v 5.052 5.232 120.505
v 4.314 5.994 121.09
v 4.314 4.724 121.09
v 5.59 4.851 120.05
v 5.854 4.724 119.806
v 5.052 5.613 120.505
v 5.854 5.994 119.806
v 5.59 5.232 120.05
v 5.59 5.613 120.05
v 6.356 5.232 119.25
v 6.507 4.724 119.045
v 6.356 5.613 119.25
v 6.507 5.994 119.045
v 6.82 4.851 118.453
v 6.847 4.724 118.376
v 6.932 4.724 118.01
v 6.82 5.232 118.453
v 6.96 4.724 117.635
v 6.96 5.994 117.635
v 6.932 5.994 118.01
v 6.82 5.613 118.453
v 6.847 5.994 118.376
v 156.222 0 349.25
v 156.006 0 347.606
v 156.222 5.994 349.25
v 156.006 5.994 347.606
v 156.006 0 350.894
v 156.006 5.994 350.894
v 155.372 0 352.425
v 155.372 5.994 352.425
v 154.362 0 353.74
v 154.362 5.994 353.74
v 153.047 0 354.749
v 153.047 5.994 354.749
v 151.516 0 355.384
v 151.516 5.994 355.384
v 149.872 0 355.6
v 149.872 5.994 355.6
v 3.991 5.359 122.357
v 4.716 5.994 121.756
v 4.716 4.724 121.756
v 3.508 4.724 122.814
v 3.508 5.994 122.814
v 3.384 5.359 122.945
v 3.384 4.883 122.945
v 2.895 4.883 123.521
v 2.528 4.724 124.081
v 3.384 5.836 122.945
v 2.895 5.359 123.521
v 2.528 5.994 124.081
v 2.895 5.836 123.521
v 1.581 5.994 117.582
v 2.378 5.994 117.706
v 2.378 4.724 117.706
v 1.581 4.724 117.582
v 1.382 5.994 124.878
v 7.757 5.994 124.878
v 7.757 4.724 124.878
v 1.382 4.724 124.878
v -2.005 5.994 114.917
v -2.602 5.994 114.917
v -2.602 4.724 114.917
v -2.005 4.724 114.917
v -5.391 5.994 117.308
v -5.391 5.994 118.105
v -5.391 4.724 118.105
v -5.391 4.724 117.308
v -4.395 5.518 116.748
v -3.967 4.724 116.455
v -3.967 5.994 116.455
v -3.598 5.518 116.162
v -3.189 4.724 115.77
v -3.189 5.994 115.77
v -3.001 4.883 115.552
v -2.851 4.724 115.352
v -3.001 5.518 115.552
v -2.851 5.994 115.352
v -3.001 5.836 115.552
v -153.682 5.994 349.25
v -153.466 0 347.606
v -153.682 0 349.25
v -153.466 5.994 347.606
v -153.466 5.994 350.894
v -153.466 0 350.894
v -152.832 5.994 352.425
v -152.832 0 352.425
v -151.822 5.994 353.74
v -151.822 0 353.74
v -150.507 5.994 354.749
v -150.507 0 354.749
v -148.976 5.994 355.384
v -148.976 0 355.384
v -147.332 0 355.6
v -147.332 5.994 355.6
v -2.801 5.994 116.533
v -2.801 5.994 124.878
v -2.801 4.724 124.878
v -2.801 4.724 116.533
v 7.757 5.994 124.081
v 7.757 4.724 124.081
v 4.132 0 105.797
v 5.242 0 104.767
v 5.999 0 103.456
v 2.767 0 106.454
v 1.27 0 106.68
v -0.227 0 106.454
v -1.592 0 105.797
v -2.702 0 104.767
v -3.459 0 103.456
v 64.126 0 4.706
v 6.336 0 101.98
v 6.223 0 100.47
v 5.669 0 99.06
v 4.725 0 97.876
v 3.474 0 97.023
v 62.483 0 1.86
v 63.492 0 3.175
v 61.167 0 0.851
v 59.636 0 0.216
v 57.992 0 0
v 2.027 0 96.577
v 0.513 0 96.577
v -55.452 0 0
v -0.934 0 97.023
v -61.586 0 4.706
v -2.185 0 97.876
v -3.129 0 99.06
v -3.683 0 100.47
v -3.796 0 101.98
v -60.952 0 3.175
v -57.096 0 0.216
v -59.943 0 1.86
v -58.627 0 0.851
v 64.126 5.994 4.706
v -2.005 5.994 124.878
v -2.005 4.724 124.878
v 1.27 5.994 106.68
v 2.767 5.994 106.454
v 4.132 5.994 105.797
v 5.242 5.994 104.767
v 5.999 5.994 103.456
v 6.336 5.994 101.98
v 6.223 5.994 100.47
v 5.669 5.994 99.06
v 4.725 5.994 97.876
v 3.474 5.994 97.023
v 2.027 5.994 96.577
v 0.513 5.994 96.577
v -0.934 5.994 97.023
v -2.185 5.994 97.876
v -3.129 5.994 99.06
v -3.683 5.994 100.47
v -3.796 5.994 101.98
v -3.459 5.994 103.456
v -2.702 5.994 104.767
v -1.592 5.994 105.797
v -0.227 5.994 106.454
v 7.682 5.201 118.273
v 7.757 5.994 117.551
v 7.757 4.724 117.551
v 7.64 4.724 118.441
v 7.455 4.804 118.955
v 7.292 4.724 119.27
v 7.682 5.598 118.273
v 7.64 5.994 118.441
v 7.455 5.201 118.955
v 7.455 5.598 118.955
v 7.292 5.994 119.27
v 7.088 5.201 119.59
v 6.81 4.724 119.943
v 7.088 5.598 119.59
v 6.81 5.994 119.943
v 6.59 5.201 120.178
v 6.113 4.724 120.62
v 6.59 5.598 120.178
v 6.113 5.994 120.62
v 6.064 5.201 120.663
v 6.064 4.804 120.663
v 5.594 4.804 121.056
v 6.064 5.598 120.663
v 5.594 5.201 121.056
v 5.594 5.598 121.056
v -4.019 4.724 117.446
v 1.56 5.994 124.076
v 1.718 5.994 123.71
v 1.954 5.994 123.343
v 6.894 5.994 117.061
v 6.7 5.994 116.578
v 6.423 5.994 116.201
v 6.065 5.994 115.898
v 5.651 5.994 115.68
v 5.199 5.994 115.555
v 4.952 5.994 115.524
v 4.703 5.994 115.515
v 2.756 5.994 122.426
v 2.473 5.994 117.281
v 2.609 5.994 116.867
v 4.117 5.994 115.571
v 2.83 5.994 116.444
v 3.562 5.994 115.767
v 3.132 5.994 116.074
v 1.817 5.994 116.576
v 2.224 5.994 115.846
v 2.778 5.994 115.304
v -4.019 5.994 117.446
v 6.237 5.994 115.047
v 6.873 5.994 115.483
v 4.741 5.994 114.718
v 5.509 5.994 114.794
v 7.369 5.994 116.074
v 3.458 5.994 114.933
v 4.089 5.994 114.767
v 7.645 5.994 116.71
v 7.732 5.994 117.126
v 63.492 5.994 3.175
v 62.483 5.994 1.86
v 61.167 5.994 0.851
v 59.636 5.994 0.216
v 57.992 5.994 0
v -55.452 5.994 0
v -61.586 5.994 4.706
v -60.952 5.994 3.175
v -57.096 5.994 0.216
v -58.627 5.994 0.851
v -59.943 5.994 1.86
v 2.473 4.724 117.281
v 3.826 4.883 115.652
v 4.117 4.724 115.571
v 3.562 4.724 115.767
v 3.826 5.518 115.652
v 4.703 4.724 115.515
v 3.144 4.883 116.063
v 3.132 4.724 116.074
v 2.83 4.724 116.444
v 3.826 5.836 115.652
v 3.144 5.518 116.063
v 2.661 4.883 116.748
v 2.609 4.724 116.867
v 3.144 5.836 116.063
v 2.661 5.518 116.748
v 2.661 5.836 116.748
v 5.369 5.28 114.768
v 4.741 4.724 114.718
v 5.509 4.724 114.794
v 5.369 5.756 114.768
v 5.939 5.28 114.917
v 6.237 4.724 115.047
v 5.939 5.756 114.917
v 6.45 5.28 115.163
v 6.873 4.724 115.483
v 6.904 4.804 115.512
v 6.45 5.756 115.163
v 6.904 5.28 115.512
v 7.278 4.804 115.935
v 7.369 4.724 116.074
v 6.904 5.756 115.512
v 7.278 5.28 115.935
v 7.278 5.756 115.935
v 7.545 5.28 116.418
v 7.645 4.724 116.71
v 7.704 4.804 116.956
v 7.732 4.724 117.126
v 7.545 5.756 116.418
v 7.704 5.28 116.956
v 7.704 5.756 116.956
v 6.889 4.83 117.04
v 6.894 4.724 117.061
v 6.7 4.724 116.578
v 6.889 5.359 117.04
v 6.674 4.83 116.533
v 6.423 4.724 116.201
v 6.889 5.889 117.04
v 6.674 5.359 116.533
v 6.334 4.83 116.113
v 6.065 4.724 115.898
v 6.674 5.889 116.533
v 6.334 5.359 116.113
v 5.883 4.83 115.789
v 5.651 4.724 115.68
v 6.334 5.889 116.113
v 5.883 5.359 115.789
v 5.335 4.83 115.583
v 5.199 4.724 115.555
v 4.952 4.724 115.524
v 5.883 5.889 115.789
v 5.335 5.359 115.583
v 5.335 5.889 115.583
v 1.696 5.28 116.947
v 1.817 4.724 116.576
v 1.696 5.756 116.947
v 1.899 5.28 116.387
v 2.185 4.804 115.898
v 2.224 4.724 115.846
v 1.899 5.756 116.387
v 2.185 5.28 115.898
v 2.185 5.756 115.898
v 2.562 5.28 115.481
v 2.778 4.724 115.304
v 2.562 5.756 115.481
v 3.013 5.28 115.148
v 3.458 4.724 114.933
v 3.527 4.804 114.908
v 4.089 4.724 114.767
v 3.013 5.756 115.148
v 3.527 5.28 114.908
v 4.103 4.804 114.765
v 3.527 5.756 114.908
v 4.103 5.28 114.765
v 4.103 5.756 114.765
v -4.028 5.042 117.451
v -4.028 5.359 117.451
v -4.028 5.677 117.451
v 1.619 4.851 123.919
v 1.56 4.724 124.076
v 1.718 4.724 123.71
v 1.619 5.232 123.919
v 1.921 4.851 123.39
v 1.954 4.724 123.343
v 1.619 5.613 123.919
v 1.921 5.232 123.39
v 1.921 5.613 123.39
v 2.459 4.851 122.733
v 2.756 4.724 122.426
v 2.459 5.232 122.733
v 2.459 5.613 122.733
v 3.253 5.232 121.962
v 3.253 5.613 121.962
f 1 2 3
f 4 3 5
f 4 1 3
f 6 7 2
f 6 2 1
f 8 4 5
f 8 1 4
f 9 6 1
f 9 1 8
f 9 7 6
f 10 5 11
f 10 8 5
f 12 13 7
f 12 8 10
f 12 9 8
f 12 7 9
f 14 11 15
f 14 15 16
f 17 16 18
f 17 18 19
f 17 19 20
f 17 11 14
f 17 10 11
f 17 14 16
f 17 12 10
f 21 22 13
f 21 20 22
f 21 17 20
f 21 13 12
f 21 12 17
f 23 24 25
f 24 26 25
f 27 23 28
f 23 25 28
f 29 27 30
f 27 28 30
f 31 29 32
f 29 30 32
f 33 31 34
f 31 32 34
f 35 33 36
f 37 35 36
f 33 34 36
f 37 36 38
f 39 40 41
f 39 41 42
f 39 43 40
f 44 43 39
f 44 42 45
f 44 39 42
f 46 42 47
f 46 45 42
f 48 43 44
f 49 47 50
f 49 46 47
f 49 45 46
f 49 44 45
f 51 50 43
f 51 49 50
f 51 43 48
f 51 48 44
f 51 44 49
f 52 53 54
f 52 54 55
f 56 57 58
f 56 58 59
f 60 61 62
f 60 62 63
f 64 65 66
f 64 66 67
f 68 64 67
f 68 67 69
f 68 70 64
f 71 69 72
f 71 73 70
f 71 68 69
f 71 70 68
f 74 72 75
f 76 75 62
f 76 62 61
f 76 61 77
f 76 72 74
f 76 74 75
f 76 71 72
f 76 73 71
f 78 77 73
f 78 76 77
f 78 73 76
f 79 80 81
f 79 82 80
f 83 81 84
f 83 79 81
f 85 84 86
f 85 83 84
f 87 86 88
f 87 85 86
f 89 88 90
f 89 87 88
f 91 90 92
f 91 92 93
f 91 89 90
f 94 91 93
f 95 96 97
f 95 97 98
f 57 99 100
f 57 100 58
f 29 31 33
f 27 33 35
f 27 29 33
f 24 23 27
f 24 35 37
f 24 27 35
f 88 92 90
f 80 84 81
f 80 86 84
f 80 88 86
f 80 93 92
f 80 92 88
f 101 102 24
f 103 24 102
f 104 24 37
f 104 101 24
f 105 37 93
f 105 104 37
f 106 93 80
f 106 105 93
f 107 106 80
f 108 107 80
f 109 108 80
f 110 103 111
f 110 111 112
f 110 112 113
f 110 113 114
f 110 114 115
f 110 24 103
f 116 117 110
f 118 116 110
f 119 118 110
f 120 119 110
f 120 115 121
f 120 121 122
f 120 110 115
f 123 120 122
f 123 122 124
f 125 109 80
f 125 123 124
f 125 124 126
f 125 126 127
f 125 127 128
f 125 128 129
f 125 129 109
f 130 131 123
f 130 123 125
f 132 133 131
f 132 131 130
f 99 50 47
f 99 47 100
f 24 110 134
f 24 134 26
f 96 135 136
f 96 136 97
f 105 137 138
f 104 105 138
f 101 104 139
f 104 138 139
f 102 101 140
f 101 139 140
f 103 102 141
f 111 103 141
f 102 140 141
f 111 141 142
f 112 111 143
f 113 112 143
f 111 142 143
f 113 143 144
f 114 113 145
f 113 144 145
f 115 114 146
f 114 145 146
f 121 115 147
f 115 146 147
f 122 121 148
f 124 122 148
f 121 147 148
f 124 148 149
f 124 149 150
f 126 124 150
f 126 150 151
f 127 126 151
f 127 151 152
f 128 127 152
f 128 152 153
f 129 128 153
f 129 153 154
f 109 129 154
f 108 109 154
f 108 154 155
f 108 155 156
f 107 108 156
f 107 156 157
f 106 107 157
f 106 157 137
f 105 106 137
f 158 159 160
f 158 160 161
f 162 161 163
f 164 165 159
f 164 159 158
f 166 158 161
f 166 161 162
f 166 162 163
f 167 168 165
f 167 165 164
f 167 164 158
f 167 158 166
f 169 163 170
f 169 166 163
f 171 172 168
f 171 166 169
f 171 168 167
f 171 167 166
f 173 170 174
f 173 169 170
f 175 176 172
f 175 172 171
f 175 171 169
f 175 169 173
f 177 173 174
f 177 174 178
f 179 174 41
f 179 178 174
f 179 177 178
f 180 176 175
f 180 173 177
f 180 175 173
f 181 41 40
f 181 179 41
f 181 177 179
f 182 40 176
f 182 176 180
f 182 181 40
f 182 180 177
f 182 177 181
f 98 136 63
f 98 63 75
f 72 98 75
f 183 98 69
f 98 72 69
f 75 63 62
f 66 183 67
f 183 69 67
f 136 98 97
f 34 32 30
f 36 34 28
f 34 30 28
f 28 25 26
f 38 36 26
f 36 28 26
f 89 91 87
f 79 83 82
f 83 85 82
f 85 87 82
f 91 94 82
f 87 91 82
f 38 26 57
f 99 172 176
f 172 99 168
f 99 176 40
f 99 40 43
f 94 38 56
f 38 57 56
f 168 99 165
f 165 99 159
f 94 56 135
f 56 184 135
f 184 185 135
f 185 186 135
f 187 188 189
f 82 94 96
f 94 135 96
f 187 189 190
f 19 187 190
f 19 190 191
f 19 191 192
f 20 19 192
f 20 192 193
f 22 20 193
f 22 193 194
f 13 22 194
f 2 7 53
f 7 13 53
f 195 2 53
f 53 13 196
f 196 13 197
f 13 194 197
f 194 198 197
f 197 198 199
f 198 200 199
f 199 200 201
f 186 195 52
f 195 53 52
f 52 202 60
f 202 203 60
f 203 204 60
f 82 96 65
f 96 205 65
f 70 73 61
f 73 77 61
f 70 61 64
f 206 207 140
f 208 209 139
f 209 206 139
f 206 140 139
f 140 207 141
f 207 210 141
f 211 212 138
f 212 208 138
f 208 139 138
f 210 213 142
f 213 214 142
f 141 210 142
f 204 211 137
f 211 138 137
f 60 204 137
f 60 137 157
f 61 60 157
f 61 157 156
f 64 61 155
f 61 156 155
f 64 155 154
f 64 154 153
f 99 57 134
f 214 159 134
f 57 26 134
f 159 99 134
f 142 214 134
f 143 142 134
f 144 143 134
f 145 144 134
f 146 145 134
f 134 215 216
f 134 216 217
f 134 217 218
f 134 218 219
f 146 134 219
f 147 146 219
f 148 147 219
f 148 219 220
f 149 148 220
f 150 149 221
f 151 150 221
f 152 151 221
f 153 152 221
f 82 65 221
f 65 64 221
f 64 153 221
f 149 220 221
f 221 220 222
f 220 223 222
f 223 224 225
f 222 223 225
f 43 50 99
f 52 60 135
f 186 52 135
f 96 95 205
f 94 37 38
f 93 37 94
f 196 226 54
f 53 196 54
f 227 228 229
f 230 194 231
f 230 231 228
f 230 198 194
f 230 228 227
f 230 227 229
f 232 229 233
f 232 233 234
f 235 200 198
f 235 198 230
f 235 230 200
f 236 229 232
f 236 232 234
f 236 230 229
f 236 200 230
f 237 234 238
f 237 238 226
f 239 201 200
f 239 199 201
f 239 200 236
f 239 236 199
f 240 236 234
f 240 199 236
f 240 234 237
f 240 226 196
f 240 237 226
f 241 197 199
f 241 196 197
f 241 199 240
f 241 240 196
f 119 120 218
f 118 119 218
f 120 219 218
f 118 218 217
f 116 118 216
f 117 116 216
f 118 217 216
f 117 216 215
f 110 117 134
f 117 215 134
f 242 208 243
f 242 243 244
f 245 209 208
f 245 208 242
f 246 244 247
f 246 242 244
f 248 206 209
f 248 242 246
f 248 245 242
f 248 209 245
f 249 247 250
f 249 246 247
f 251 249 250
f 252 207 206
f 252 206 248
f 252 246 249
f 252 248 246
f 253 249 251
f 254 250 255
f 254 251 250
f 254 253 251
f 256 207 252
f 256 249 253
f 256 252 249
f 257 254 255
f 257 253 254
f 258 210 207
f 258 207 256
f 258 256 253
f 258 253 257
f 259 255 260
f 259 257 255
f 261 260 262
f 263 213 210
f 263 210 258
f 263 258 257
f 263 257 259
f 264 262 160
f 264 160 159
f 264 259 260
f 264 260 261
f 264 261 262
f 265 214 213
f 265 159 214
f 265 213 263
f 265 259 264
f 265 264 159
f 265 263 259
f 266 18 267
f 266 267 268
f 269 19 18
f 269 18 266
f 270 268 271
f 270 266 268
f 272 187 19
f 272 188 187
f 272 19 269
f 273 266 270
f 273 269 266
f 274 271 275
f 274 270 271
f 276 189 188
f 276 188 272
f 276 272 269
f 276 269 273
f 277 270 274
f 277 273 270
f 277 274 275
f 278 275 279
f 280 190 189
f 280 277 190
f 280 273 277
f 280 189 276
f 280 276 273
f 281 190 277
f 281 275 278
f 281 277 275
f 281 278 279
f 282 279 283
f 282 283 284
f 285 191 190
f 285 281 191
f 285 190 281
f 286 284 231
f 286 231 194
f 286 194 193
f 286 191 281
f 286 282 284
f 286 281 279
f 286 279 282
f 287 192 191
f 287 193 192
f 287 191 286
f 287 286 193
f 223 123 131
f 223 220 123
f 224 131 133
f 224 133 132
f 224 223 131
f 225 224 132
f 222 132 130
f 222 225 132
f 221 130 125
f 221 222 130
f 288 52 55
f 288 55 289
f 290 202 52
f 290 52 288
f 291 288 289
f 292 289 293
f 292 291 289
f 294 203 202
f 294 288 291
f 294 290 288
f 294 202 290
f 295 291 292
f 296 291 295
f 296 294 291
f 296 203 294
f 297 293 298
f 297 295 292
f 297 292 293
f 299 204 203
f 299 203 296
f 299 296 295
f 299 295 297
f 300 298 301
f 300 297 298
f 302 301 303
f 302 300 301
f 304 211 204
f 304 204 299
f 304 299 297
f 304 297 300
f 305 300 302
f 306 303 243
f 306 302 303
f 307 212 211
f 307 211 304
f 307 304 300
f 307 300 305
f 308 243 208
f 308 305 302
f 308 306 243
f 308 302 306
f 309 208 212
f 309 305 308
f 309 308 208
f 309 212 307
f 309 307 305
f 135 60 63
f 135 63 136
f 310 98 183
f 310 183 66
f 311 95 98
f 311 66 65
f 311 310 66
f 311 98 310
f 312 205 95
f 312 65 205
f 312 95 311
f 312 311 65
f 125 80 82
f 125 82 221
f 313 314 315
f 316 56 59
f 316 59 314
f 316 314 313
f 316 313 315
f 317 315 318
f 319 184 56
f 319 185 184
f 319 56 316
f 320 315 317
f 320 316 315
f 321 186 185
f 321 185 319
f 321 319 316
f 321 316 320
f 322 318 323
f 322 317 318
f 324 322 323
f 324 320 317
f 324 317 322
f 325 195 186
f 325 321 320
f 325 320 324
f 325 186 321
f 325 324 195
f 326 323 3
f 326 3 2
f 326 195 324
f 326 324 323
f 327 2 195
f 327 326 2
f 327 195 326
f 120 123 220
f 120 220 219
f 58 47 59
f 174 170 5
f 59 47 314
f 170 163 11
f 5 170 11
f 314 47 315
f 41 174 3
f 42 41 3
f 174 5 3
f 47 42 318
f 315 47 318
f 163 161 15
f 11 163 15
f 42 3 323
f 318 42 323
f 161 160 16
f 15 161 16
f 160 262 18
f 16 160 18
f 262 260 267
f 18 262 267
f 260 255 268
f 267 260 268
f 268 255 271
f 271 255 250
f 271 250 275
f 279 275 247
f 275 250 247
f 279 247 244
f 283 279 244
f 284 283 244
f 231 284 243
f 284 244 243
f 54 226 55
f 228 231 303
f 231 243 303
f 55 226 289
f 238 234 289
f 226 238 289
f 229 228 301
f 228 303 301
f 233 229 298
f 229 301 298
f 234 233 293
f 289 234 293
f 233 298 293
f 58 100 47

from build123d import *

# Parameters (mm, degrees)
BOSS_EXTRUDE1_DEPTH = 5.9944
SKETCH2_R           = 5.08
CUT_EXTRUDE1_DEPTH  = 390.227437664
CUT_EXTRUDE2_DEPTH  = 1.27
FILLET1_R           = 6.35


with BuildPart() as part:
    # Sketch1 → Boss-Extrude1 (new body)
    with BuildSketch(Plane(origin=(0, 0, 0), x_dir=(1, 0, 0), z_dir=(0, 1, 0))):
        Polygon((-60.325, 0), (62.865, 0), (158.147732829, -355.6), (-155.607732829, -355.6), align=None)
    extrude(amount=BOSS_EXTRUDE1_DEPTH)

    # Sketch2 → Cut-Extrude1 (cut, through all)
    with BuildSketch(Plane(origin=(0, 5.9944, 0), x_dir=(1, 0, 0), z_dir=(0, 1, 0))):
        with Locations(Location((1.27, -101.6, 0), (0, 0, 270))):
            Circle(SKETCH2_R)
    extrude(amount=-CUT_EXTRUDE1_DEPTH, mode=Mode.SUBTRACT)

    # Sketch3 → Cut-Extrude2 (cut)
    with BuildSketch(Plane(origin=(0, 5.9944, 0), x_dir=(1, 0, 0), z_dir=(0, 1, 0))):
        with BuildLine():
            Line((-2.004607843, -124.878144621), (-2.801470588, -124.878144621))
            Line((-2.801470588, -124.878144621), (-2.801470588, -116.532875013))
            add(Edge.make_bspline(
                [(-2.801470588, -116.532875013), (-2.997580196, -116.700819797), (-3.386189924, -117.033618267), (-4.021446732, -117.460305556), (-4.686888668, -117.826576867), (-5.156638111, -118.012129239), (-5.39127451, -118.104811287)],
                knots=[0, 0, 0, 0, 1.01587232, 2.013047047, 3.007531584, 4, 4, 4, 4], degree=3))
            Line((-5.39127451, -118.104811287), (-5.39127451, -117.307948542))
            add(Edge.make_bspline(
                [(-5.39127451, -117.307948542), (-5.215920906, -117.217505842), (-4.877167455, -117.042785871), (-4.403316888, -116.758839494), (-3.978244692, -116.470049726), (-3.602949198, -116.17444242), (-3.276786637, -115.872526552), (-3.001240232, -115.563383013), (-2.771725814, -115.249055295), (-2.657674184, -115.025829059), (-2.602254902, -114.917360307)],
                knots=[0, 0, 0, 0, 1.266365021, 2.446402654, 3.543839948, 4.563310278, 5.51059178, 6.392882026, 7.219078889, 8, 8, 8, 8], degree=3))
            Line((-2.602254902, -114.917360307), (-2.004607843, -114.917360307))
            Line((-2.004607843, -114.917360307), (-2.004607843, -124.878144621))
        make_face()
        with BuildLine():
            Line((7.756960784, -124.878144621), (1.382058824, -124.878144621))
            add(Edge.make_bspline(
                [(1.382058824, -124.878144621), (1.408711728, -124.714616011), (1.461765394, -124.389105805), (1.581972244, -123.981996467), (1.743426669, -123.650686593), (1.9293472, -123.370987394), (2.168929241, -123.057519518), (2.47120082, -122.71410621), (2.835292405, -122.341606598), (3.26682725, -121.943231351), (3.76528863, -121.520849044), (4.12547647, -121.238121937), (4.314264706, -121.089933836)],
                knots=[0, 0, 0, 0, 1.00794059, 2.006345856, 2.568221262, 3.244176762, 4.045978883, 4.967707078, 6.025786227, 7.214078669, 8.539791974, 10, 10, 10, 10], degree=3))
            add(Edge.make_bspline(
                [(4.314264706, -121.089933836), (4.44517426, -120.987435642), (4.692315869, -120.79393129), (5.03663113, -120.518956984), (5.330891728, -120.274531461), (5.654603916, -119.998078646), (6.00245485, -119.669813627), (6.353952481, -119.268109359), (6.634490533, -118.868145818), (6.82961898, -118.465238329), (6.941715143, -118.053908101), (6.953924697, -117.775536057), (6.960098039, -117.634786777)],
                knots=[0, 0, 0, 0, 1.105083233, 2.086265203, 2.928643677, 3.647492745, 4.915719202, 6.103603942, 7.190110835, 8.152548768, 9.065899631, 10, 10, 10, 10], degree=3))
            add(Edge.make_bspline(
                [(6.960098039, -117.634786777), (6.956446087, -117.531840775), (6.949349268, -117.331786414), (6.896203587, -117.042256181), (6.805514931, -116.774954845), (6.678536736, -116.530021827), (6.524513793, -116.305351489), (6.336809674, -116.107371083), (6.124267579, -115.931524187), (5.883239638, -115.782669248), (5.619825862, -115.659684087), (5.331783261, -115.577707036), (5.025139044, -115.521422364), (4.812576912, -115.517184746), (4.703357843, -115.515007366)],
                knots=[0, 0, 0, 0, 1.066440105, 2.072406788, 3.038089023, 3.980626898, 4.923164774, 5.851240192, 6.79842777, 7.774055624, 8.779619978, 9.800248095, 10.869719403, 12, 12, 12, 12], degree=3))
            add(Edge.make_bspline(
                [(4.703357843, -115.515007366), (4.548138853, -115.520928959), (4.250554949, -115.532281765), (3.828569287, -115.636647969), (3.455686954, -115.810346784), (3.131253079, -116.053703201), (2.863324958, -116.371844332), (2.643875434, -116.754056503), (2.47967465, -117.206553497), (2.413141707, -117.534067539), (2.378137255, -117.706379915)],
                knots=[0, 0, 0, 0, 1.052503955, 2.0178474, 2.928593632, 3.828899676, 4.748107049, 5.732867451, 6.807211463, 8, 8, 8, 8], degree=3))
            Line((2.378137255, -117.706379915), (1.58127451, -117.581870111))
            add(Edge.make_bspline(
                [(1.58127451, -117.581870111), (1.595076615, -117.472635137), (1.622075599, -117.258955176), (1.691468745, -116.949821561), (1.781188383, -116.65900971), (1.894180859, -116.386211747), (2.027180985, -116.131787712), (2.181450374, -115.894298832), (2.359285462, -115.67667965), (2.558282869, -115.477221584), (2.777101916, -115.300105787), (3.010614318, -115.143004122), (3.261947111, -115.012623851), (3.527029837, -114.902576084), (3.808744154, -114.818752319), (4.105725503, -114.759825606), (4.418264758, -114.725756279), (4.631681691, -114.72071836), (4.740710784, -114.718144621)],
                knots=[0, 0, 0, 0, 1.11558569, 2.182252598, 3.206865404, 4.197163727, 5.171016007, 6.113287932, 7.062752653, 8.014719109, 8.96418383, 9.912249364, 10.862587531, 11.829428462, 12.817713982, 13.836697005, 14.894825442, 16, 16, 16, 16], degree=3))
            add(Edge.make_bspline(
                [(4.740710784, -114.718144621), (4.847691173, -114.72046441), (5.058171976, -114.725028527), (5.36652187, -114.763086832), (5.660393604, -114.82495492), (5.939114933, -114.911807601), (6.20152099, -115.026029366), (6.453209418, -115.158232899), (6.686929332, -115.3230483), (6.90677244, -115.507442597), (7.10466303, -115.712898212), (7.281765919, -115.930826025), (7.427856103, -116.167038419), (7.551242282, -116.415109275), (7.639716311, -116.6810721), (7.709539512, -116.957384709), (7.75083418, -117.249641754), (7.754889172, -117.448930261), (7.756960784, -117.55074266)],
                knots=[0, 0, 0, 0, 1.106681904, 2.177364475, 3.209175827, 4.210887483, 5.192078542, 6.167200624, 7.147039734, 8.145062256, 9.132109826, 10.094560107, 11.044836899, 12.000375742, 12.954465884, 13.938765234, 14.946957558, 16, 16, 16, 16], degree=3))
            add(Edge.make_bspline(
                [(7.756960784, -117.55074266), (7.753392459, -117.673373377), (7.746338565, -117.915790814), (7.689282598, -118.27439108), (7.590587318, -118.620687231), (7.461036956, -118.958802553), (7.290519429, -119.282309345), (7.09006167, -119.596153204), (6.8567572, -119.897227952), (6.634069689, -120.13817633), (6.430892234, -120.330451922), (6.256380071, -120.493260828), (6.057657341, -120.670326555), (5.833743473, -120.859320414), (5.585765126, -121.061219336), (5.319829881, -121.283578823), (5.026752033, -121.516537042), (4.821857186, -121.674370634), (4.715808824, -121.756061287)],
                knots=[0, 0, 0, 0, 1.088993338, 2.152731221, 3.214950677, 4.282992305, 5.363056107, 6.45734114, 7.587448717, 8.741912054, 9.367708333, 10.072059012, 10.861970471, 11.731730561, 12.674646287, 13.702521352, 14.810883478, 16, 16, 16, 16], degree=3))
            add(Edge.make_bspline(
                [(4.715808824, -121.756061287), (4.589531577, -121.855817691), (4.343139397, -122.050462401), (3.994847151, -122.350096885), (3.673432745, -122.643330902), (3.386447313, -122.938064959), (3.127000006, -123.22720294), (2.897403274, -123.51287463), (2.693792631, -123.79321546), (2.582015901, -123.986901831), (2.52754902, -124.081281875)],
                knots=[0, 0, 0, 0, 1.201760701, 2.344875646, 3.430713183, 4.449969728, 5.415927222, 6.330865599, 7.186659457, 8, 8, 8, 8], degree=3))
            Line((2.52754902, -124.081281875), (7.756960784, -124.081281875))
            Line((7.756960784, -124.081281875), (7.756960784, -124.878144621))
        make_face()
    extrude(amount=-CUT_EXTRUDE2_DEPTH, mode=Mode.SUBTRACT)

    # Fillet1
    fillet1_edges = [part.edges().sort_by_distance(p)[0] for p in [
        (158.147732829, 2.9972, 355.6),
        (-155.607732829, 2.9972, 355.6),
        (-60.325, 2.9972, 0),
        (62.865, 2.9972, 0),
    ]]
    fillet(fillet1_edges, radius=FILLET1_R)


solid = part.part
